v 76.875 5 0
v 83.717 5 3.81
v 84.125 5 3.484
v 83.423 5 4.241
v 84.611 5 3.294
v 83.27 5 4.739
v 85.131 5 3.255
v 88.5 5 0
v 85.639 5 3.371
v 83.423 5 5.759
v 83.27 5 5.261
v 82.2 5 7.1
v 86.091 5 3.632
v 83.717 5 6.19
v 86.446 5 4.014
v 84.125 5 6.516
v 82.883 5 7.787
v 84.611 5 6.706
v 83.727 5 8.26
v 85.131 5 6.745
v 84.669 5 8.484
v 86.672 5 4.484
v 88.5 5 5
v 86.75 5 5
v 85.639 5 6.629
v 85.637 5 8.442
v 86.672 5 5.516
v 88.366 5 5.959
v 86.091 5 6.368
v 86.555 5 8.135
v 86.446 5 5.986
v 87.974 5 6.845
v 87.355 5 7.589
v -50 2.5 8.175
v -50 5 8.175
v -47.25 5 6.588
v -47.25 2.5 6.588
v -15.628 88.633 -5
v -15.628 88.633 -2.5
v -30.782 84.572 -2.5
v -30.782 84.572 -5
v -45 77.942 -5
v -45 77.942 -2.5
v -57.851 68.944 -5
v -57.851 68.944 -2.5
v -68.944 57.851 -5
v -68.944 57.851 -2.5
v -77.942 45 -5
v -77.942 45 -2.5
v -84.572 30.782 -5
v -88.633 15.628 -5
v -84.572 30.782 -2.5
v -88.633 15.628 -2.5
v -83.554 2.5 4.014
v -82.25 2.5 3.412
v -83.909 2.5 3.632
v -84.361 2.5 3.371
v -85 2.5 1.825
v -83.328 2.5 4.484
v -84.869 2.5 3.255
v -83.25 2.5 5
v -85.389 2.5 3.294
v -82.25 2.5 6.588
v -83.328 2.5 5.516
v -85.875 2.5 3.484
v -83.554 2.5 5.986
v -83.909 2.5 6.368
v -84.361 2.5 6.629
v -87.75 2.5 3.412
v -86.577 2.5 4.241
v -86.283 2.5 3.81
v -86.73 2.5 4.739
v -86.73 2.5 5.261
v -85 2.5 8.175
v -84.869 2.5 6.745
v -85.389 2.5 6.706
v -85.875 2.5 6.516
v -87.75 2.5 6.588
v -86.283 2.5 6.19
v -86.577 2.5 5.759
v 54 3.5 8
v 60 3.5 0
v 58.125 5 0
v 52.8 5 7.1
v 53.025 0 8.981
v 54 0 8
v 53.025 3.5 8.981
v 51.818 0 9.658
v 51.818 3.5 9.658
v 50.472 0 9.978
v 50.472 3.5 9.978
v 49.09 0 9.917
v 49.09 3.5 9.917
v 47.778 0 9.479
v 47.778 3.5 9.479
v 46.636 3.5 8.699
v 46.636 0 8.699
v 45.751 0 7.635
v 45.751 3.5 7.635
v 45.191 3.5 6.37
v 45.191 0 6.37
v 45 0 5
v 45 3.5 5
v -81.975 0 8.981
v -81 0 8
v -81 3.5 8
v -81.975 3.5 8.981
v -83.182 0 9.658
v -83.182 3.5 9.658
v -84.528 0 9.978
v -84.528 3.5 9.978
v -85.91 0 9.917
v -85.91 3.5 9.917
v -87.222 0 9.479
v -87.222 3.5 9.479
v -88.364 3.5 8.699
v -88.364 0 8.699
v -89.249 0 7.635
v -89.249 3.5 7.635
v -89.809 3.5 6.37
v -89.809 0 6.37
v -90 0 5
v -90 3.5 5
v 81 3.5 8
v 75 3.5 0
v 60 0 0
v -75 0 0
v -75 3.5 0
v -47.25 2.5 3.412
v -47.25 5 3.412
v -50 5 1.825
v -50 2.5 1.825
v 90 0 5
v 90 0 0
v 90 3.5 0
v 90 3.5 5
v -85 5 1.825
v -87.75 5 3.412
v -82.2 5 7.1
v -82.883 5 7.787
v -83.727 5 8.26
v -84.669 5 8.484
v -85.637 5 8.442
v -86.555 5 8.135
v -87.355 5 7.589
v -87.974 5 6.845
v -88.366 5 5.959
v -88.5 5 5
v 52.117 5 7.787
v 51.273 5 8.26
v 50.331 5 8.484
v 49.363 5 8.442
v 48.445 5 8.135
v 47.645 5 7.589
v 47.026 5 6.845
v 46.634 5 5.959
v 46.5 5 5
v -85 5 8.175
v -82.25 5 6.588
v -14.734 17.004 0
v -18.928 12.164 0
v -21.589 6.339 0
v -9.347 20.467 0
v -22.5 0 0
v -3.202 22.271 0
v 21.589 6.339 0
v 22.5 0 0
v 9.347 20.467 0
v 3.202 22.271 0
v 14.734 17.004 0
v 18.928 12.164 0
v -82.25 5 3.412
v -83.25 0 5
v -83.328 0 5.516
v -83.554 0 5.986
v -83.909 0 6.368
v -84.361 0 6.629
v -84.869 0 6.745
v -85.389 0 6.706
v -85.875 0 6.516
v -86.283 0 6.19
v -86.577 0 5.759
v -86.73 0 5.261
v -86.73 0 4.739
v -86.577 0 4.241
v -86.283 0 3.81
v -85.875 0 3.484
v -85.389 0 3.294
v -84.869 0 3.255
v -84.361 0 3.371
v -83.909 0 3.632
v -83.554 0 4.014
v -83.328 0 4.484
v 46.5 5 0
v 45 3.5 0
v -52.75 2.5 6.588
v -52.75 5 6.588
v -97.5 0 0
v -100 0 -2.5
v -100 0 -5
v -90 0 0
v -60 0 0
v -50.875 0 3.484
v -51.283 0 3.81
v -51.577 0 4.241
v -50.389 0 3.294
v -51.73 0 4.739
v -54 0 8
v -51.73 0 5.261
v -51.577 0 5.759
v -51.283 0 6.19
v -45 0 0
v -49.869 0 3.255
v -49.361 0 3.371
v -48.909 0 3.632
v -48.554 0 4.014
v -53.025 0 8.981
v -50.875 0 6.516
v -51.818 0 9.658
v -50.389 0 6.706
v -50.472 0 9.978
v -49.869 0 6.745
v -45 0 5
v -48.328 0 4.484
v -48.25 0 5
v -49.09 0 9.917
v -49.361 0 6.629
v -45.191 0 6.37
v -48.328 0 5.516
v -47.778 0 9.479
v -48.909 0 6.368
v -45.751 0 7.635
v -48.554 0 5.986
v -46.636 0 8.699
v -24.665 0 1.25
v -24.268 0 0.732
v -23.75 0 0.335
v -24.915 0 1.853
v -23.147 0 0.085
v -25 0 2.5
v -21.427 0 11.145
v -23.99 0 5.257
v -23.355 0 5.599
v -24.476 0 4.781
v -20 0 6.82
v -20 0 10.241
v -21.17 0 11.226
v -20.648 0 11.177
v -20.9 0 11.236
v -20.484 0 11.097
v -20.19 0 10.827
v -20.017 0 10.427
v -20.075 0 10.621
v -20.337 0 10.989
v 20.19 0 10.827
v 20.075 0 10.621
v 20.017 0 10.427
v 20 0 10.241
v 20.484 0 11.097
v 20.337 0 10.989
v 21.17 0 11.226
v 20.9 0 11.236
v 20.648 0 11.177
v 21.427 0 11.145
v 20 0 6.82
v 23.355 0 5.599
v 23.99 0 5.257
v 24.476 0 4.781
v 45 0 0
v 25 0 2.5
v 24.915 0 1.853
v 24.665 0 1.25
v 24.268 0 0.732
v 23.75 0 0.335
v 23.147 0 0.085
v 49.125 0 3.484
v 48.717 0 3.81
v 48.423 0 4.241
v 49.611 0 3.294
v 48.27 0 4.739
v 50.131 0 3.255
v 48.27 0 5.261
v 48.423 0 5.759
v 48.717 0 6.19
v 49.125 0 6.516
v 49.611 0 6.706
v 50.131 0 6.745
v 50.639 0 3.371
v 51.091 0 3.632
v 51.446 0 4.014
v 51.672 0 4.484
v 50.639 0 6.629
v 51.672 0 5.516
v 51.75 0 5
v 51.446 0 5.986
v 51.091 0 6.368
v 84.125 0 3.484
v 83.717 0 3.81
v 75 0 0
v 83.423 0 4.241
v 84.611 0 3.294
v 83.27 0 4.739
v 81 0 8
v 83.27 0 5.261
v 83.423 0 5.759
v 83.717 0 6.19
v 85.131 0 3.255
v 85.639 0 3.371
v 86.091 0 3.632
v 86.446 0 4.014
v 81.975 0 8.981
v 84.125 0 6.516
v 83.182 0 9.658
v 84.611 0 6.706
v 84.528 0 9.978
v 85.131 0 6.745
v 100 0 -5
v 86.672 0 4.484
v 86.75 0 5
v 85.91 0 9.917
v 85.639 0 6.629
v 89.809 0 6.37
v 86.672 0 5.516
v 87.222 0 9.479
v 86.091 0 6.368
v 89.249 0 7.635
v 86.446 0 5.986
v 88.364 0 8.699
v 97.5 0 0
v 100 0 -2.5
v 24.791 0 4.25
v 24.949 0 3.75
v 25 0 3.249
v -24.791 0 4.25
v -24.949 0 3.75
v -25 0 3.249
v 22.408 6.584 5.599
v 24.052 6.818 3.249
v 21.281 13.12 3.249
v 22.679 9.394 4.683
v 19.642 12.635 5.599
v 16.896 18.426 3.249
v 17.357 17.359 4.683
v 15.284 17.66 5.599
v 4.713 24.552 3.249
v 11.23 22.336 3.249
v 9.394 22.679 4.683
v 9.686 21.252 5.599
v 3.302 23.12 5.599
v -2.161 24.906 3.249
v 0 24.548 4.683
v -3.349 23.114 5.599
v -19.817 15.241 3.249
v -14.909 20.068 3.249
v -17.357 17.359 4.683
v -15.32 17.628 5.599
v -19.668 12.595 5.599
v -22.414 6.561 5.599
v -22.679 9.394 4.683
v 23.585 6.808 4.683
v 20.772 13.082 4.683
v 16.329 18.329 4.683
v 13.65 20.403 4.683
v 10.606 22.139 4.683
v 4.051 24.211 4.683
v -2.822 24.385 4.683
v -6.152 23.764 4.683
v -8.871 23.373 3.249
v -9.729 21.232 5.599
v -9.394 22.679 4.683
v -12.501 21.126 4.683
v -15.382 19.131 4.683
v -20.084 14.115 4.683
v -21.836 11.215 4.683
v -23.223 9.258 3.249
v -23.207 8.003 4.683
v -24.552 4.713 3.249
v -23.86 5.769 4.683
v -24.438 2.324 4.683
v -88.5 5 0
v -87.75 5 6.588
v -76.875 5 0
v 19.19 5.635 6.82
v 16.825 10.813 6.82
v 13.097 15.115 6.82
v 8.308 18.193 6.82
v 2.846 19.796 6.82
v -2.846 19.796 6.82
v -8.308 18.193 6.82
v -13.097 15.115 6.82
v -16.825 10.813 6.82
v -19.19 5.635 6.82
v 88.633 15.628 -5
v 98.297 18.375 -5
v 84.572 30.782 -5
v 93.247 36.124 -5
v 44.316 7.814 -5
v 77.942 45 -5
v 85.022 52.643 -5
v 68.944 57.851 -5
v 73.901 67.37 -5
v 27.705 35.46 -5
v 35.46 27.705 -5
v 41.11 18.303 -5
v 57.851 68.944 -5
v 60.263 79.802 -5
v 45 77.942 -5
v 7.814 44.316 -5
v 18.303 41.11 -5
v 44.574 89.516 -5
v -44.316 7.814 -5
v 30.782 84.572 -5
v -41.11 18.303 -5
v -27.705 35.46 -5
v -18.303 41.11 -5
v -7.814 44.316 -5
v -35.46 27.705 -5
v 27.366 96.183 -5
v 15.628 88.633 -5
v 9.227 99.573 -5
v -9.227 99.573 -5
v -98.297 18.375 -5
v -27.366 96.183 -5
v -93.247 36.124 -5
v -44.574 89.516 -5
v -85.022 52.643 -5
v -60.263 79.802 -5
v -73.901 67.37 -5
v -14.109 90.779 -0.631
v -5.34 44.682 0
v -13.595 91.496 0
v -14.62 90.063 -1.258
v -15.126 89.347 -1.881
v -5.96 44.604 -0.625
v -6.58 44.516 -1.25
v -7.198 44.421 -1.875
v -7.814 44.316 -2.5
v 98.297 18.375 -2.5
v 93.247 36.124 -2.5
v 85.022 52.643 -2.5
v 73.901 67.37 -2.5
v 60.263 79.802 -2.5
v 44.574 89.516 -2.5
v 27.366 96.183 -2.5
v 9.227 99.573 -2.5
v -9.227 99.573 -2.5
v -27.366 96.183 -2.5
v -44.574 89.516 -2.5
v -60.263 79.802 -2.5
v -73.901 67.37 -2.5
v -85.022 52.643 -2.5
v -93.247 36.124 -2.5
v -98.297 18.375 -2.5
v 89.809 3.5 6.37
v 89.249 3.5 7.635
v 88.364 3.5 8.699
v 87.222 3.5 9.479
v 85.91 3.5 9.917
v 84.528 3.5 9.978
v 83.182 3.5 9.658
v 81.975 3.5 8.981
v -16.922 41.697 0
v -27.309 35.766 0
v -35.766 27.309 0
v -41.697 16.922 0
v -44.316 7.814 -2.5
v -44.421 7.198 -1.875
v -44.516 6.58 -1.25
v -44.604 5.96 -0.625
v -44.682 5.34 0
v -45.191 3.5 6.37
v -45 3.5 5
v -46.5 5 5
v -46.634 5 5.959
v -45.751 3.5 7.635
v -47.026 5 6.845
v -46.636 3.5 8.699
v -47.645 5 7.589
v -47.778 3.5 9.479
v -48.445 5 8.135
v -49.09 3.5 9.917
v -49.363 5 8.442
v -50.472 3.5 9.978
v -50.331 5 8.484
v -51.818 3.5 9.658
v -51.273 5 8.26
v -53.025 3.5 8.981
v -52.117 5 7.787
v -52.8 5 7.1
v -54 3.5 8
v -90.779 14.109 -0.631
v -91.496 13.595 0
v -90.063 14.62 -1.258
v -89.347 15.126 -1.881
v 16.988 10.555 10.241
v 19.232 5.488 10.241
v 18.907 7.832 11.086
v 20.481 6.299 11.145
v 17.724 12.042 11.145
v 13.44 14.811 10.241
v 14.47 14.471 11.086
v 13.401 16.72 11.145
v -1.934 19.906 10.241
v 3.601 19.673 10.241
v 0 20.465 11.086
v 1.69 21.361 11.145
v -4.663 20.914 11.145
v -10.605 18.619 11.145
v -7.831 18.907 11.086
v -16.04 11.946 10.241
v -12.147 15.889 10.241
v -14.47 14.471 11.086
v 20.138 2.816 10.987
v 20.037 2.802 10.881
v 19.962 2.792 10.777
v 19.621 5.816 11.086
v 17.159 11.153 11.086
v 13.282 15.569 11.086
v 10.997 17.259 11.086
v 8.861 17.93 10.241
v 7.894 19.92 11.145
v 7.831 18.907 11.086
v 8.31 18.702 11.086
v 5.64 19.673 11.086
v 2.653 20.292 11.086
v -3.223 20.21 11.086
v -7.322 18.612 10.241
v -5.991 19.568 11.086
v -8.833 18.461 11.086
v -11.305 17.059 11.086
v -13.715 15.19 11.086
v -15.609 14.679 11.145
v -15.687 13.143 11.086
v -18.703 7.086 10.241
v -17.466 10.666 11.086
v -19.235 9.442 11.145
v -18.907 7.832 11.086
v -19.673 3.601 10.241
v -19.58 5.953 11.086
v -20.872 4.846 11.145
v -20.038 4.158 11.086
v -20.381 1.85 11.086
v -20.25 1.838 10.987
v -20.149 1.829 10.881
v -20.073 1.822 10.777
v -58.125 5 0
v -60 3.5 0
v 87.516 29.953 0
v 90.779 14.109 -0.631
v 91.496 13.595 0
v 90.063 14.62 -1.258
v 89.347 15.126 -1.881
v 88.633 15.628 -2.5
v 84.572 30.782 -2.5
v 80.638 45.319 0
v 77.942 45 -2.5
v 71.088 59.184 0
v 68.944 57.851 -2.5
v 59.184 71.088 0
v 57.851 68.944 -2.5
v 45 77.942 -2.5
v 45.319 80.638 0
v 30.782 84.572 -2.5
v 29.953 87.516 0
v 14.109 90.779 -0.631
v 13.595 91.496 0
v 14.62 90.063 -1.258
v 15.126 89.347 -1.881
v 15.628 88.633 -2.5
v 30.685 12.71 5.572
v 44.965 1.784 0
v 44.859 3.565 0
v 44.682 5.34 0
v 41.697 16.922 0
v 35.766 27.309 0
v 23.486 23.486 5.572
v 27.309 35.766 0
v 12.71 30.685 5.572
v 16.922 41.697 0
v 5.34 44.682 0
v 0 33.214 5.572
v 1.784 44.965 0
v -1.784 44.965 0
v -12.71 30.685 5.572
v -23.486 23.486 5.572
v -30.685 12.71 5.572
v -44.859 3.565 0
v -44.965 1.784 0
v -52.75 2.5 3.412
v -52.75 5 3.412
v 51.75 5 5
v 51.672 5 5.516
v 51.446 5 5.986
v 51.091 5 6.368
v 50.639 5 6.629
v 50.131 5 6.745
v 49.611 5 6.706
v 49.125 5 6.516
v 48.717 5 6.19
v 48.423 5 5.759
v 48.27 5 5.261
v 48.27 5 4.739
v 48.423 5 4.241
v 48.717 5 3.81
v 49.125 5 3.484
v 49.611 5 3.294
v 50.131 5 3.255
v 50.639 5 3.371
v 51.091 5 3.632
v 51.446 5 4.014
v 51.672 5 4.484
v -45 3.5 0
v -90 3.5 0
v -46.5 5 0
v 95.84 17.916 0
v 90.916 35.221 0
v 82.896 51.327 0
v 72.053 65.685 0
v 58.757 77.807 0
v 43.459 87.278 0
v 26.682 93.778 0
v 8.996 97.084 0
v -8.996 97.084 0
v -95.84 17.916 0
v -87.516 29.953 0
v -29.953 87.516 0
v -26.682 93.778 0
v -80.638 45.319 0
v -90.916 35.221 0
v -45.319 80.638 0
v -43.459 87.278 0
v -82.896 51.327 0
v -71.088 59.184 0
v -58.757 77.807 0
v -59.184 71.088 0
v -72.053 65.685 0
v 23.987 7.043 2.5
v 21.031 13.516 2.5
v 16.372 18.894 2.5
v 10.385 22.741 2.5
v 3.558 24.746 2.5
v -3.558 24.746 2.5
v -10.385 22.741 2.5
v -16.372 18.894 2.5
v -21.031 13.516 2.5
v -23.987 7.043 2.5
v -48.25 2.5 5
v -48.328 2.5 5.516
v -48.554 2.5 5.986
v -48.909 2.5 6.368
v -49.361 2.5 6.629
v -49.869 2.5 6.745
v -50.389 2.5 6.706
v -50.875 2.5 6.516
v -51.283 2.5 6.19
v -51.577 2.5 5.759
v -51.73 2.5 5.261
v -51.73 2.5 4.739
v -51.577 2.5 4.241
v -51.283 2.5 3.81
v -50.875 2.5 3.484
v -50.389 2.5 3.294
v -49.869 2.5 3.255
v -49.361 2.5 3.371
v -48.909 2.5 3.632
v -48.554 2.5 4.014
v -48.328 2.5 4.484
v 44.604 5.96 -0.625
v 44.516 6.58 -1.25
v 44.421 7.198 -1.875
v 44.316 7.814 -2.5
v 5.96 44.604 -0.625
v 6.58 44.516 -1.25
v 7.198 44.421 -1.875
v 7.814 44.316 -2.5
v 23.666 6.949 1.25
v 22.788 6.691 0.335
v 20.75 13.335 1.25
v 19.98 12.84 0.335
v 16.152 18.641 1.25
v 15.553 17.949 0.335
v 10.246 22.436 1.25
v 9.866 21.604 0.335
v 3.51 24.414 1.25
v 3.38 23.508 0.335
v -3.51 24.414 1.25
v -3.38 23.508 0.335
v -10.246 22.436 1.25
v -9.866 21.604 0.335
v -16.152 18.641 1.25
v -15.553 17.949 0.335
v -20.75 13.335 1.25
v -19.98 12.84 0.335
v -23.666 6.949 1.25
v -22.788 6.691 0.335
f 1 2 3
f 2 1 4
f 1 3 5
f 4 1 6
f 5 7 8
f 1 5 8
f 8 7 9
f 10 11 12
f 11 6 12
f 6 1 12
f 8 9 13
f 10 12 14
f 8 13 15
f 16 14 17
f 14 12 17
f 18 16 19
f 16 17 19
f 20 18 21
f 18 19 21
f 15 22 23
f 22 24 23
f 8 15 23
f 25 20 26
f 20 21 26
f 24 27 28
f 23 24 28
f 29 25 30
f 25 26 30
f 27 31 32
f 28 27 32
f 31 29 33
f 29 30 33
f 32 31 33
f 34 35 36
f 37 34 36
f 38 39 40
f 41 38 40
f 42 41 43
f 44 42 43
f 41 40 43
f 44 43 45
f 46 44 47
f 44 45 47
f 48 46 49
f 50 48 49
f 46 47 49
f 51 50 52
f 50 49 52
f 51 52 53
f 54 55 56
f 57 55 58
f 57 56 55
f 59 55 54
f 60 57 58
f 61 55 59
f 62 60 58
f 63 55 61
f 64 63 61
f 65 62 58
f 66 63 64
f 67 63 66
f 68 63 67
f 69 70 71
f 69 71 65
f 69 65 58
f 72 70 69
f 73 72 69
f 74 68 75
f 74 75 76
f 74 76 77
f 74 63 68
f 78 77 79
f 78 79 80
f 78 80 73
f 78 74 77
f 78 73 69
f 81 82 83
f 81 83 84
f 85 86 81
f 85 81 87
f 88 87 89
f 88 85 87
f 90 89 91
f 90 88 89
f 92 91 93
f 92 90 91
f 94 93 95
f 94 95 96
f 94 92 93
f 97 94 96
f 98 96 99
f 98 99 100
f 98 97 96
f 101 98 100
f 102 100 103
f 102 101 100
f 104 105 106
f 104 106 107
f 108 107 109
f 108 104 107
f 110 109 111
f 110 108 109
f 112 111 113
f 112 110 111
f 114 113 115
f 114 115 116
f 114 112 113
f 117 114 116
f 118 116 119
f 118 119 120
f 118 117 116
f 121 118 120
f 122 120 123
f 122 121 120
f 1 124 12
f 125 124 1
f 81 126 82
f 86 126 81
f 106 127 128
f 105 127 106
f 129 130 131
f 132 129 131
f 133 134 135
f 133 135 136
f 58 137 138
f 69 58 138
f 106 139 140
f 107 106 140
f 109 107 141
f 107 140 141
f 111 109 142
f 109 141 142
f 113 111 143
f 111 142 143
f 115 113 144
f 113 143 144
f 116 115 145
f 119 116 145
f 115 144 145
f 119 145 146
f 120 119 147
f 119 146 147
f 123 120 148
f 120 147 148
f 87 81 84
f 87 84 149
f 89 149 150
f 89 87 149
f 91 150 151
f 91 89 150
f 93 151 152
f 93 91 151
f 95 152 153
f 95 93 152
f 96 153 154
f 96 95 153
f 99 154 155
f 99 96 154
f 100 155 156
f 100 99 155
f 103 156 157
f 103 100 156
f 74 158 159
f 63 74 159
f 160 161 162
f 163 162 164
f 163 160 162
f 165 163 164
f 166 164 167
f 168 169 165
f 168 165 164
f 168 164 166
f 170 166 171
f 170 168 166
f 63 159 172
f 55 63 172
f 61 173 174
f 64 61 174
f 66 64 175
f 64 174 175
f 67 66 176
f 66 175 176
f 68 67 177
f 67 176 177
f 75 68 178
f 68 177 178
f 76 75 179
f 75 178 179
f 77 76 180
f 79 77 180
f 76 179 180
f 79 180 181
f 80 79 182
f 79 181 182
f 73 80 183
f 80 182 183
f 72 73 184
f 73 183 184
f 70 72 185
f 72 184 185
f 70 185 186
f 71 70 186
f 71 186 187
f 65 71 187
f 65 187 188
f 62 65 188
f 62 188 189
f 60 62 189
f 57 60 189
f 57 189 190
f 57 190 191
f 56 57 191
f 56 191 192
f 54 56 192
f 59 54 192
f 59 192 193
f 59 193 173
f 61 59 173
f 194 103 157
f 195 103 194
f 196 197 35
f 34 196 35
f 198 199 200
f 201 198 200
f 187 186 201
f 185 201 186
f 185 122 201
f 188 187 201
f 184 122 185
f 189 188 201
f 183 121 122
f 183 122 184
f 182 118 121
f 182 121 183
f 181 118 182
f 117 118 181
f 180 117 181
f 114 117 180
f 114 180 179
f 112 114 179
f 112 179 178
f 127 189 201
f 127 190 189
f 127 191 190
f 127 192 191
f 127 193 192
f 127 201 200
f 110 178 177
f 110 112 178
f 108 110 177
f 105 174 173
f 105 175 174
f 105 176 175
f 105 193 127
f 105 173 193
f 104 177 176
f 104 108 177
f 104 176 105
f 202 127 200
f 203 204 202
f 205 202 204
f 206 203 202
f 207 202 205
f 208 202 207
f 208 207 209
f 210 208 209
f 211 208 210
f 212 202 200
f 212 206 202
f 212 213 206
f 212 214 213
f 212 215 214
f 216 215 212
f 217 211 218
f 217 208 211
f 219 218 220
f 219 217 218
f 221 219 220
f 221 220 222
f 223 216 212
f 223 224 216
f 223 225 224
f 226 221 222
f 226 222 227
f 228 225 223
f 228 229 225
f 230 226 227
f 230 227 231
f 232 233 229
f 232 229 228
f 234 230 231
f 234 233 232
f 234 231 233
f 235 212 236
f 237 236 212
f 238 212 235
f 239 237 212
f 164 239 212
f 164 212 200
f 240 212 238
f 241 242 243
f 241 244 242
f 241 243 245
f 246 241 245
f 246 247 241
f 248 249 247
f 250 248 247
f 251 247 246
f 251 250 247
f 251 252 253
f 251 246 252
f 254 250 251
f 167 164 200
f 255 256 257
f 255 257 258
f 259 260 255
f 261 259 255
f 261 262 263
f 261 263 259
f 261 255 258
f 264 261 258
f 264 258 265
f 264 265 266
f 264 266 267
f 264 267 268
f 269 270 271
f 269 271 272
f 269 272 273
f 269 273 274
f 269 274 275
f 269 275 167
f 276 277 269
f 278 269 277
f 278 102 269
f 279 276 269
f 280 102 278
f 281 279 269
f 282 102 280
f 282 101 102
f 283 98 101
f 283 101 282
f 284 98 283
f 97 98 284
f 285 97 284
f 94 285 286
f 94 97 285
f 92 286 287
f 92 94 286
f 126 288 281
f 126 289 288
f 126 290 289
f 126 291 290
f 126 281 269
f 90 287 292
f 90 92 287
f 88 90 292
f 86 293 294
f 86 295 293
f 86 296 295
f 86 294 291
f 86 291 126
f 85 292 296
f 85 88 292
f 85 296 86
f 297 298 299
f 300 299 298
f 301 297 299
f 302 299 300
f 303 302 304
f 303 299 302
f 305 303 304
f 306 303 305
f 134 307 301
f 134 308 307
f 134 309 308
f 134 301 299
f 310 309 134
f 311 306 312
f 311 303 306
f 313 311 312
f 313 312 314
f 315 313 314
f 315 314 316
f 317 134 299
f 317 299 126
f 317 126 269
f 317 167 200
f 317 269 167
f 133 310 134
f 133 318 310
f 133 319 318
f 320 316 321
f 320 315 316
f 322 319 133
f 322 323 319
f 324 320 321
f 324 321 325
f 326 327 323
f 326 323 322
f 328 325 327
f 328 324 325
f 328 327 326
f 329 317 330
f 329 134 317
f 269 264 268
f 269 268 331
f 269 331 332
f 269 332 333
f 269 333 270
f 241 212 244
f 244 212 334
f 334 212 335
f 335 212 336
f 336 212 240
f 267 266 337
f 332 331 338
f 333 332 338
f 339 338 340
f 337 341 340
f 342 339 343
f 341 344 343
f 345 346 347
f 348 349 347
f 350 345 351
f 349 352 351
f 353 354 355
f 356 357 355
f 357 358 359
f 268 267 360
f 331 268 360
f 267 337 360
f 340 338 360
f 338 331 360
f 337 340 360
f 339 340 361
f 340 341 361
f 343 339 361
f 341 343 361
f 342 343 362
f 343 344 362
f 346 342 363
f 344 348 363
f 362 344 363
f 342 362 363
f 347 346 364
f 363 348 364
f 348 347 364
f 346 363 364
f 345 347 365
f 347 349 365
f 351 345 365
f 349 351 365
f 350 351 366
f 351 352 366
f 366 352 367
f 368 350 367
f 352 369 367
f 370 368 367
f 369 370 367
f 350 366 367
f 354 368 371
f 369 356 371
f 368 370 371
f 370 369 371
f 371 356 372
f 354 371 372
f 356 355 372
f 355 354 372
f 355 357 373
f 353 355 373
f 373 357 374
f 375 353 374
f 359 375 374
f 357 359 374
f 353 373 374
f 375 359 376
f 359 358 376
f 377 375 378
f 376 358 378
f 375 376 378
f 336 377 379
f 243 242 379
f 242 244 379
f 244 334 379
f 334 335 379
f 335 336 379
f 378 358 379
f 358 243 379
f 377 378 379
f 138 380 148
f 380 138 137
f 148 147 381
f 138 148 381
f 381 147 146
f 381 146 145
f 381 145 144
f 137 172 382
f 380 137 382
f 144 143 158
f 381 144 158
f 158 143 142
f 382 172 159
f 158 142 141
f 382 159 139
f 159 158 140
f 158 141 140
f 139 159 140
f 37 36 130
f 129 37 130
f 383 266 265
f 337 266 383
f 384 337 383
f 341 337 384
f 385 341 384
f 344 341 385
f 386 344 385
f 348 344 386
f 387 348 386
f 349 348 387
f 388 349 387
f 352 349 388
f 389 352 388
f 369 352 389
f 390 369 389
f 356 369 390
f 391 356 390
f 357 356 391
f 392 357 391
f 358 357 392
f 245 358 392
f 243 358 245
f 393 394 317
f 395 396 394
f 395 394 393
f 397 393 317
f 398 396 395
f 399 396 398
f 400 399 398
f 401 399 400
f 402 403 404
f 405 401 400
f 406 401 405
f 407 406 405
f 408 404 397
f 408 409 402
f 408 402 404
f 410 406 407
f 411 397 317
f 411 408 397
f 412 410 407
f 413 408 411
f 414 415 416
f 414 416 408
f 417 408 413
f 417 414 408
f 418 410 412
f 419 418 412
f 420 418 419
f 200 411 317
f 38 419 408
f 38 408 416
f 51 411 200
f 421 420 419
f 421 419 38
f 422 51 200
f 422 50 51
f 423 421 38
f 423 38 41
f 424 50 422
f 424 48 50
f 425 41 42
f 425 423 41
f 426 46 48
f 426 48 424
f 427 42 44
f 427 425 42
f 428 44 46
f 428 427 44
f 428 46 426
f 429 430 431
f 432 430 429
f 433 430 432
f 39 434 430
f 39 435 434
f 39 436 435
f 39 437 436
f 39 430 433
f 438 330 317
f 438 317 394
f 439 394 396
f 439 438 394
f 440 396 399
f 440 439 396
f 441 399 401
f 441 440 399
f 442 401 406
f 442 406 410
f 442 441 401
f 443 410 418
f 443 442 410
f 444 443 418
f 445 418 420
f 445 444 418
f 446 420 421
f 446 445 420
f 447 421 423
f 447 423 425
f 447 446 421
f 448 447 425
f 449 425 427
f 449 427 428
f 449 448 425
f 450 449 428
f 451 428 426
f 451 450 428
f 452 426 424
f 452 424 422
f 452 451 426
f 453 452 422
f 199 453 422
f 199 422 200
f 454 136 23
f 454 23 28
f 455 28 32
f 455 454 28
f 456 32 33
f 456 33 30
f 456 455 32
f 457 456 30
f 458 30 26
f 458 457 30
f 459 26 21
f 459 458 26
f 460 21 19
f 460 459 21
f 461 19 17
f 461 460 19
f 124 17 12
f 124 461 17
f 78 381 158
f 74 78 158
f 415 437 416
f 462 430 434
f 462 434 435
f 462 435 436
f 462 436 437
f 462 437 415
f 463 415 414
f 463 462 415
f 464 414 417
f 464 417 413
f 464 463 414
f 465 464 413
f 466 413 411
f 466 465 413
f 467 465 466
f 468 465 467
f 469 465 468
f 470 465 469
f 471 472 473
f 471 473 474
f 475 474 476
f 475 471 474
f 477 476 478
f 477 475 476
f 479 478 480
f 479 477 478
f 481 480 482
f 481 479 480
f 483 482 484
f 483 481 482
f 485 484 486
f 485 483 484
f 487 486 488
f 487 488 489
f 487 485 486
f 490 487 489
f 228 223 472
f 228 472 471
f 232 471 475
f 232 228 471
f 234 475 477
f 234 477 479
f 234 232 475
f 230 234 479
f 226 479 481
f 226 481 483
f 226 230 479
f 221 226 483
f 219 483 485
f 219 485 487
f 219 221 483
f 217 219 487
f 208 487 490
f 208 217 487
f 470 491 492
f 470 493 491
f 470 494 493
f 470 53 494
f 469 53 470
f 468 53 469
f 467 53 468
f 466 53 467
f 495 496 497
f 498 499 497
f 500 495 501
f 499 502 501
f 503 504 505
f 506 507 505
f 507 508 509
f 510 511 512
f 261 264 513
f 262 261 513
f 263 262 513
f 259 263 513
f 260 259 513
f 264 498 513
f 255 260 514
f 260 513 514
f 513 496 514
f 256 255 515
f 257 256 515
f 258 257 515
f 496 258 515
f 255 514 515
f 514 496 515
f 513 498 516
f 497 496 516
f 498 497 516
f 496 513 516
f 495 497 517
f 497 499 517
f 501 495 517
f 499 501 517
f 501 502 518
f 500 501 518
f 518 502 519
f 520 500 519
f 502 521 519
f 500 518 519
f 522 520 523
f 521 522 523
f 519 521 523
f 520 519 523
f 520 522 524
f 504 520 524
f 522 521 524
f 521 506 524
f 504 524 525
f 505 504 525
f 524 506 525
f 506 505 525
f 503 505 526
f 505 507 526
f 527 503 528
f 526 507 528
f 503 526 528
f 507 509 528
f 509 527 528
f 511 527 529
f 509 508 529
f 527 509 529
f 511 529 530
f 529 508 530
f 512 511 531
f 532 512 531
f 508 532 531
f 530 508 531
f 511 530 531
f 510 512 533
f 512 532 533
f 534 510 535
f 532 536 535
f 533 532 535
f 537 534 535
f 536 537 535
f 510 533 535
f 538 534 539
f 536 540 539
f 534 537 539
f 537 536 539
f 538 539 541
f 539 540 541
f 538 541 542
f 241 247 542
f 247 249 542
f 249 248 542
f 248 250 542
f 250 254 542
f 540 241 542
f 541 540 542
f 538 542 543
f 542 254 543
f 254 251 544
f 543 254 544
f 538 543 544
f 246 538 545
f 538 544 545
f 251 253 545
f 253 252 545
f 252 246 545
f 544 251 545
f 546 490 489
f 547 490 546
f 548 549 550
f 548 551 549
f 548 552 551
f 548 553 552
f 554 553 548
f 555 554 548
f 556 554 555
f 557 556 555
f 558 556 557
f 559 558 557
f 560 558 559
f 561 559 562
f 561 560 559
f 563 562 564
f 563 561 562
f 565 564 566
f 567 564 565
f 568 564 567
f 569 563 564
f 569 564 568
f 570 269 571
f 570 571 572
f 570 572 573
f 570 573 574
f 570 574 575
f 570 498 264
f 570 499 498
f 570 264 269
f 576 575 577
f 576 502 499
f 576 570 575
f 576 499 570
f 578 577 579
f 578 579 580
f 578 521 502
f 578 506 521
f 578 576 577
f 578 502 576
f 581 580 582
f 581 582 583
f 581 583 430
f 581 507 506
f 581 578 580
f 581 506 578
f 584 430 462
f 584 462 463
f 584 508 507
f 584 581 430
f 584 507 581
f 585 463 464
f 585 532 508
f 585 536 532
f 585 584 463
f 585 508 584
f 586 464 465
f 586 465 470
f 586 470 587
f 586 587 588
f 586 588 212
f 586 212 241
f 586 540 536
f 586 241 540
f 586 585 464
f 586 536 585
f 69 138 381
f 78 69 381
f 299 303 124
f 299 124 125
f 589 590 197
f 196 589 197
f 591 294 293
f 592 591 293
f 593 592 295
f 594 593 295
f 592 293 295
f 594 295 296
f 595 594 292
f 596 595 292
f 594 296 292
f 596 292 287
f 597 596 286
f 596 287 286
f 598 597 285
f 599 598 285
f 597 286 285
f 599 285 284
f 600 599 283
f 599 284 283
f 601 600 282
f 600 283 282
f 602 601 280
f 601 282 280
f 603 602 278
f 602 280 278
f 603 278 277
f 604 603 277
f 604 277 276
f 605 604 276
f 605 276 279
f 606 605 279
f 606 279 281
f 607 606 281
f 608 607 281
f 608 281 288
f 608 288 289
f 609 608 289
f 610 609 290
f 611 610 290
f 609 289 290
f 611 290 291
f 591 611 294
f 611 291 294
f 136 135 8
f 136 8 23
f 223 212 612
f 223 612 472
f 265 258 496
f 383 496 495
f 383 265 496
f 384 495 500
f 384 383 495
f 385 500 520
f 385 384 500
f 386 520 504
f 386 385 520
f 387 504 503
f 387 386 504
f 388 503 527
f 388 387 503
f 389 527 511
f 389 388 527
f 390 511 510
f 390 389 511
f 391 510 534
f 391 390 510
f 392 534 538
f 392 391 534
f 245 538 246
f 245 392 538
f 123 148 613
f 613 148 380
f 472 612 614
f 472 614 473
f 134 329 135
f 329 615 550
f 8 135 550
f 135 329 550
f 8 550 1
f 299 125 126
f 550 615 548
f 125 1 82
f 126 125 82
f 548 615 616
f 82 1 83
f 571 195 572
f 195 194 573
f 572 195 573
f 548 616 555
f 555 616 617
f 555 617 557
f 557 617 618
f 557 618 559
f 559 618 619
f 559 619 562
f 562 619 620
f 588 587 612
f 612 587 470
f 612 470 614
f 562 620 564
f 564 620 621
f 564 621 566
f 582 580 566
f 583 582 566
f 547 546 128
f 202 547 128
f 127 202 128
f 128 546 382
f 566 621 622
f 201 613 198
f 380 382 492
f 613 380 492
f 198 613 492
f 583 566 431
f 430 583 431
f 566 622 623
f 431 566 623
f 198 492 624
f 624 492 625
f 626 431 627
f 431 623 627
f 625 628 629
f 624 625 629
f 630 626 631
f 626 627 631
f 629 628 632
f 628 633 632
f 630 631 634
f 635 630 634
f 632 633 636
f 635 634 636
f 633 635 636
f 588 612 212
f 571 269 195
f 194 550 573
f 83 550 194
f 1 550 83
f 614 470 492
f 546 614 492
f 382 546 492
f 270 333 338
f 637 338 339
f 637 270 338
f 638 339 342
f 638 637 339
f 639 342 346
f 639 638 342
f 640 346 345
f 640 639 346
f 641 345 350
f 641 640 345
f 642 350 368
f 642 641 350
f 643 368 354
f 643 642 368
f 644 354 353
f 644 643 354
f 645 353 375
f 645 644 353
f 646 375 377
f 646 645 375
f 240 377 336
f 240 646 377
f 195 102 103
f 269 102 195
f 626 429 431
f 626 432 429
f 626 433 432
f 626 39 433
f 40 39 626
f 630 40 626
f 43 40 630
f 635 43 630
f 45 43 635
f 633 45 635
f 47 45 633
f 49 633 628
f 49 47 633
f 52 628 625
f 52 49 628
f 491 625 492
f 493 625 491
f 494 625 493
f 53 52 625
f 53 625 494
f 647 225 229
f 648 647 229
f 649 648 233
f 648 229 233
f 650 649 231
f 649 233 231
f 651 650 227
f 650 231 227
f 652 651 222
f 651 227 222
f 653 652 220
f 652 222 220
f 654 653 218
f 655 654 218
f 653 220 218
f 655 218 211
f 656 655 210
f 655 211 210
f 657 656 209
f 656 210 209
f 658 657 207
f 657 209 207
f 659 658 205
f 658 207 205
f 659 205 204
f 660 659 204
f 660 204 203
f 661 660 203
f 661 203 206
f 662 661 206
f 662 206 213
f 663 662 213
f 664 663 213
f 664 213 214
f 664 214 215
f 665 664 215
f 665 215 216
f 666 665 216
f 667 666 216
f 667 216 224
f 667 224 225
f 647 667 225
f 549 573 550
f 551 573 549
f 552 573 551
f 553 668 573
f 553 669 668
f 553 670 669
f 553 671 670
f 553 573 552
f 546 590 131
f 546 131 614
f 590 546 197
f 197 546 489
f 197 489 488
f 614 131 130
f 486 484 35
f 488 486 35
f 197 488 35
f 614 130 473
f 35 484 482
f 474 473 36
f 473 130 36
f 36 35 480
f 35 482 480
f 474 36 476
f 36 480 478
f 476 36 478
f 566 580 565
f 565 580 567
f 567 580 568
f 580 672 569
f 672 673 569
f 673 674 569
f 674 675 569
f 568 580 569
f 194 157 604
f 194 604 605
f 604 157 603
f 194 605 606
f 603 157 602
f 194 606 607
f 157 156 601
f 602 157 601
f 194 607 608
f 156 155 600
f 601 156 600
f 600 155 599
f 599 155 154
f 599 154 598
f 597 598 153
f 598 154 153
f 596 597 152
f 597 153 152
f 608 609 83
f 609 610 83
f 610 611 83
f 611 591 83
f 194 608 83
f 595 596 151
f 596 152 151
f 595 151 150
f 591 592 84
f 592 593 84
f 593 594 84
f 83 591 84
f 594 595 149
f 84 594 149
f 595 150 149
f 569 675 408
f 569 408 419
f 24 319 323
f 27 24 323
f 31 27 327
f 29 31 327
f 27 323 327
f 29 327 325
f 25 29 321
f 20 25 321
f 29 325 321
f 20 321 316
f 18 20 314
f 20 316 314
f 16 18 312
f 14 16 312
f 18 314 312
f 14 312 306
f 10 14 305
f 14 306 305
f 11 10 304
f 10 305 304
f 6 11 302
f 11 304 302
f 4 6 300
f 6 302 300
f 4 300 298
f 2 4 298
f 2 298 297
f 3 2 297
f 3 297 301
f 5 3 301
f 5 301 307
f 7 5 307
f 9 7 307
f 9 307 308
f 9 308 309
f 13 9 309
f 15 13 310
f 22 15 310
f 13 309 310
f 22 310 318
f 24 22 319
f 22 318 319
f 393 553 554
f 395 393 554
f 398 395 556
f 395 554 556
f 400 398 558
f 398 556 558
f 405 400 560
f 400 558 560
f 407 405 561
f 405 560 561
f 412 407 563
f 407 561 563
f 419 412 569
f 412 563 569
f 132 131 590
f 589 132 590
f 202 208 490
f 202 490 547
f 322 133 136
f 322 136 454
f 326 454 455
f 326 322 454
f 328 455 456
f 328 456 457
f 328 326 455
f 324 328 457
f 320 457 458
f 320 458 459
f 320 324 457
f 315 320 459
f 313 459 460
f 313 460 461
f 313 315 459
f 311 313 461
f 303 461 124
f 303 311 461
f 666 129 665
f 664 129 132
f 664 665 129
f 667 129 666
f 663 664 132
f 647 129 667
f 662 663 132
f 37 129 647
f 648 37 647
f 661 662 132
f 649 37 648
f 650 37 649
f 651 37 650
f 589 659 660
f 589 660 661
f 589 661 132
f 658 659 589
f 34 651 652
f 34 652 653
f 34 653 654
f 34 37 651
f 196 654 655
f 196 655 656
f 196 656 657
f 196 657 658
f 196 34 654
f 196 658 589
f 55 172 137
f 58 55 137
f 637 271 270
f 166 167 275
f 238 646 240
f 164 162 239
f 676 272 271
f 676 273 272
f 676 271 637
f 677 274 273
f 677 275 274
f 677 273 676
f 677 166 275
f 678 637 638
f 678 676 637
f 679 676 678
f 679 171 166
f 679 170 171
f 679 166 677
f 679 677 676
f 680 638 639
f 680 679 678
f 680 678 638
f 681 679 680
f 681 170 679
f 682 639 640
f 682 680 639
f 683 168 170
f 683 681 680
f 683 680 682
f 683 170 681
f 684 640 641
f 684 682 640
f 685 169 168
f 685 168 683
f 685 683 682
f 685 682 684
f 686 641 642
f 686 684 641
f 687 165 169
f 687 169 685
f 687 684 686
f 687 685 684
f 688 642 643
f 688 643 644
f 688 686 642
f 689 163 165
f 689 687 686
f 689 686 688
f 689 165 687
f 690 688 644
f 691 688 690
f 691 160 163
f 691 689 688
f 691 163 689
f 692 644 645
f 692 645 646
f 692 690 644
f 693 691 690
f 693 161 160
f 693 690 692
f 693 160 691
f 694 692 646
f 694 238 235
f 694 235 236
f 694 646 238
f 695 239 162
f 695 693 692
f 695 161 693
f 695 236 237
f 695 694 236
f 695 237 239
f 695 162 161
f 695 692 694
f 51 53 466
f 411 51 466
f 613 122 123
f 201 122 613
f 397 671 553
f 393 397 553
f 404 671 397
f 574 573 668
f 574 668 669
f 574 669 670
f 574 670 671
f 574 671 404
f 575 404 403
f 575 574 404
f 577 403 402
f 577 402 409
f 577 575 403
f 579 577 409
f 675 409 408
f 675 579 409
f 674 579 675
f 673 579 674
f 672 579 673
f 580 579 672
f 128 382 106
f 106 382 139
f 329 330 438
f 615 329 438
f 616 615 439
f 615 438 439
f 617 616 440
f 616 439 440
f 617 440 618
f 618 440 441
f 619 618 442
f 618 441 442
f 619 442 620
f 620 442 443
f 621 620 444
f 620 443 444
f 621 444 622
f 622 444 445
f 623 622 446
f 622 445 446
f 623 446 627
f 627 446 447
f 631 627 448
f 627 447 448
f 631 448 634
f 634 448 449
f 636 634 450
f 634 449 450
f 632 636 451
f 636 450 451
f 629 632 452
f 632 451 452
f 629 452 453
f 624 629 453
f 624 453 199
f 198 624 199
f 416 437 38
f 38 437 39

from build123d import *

# Parameters (mm, degrees)
F1_ANGLE      = 180
F0_W          = 10
F0_H          = 5
F2_R          = 1
F3_R          = 2.5
F4_W          = 45
F4_H          = 5
F5_ANGLE      = 10
F6_W          = 45
F6_H          = 5
F7_ANGLE      = 10
F8_W          = 45
F8_H          = 5
F9_ANGLE_BACK = 10
F9_ANGLE      = 20
F10_R         = 1.75
F11_DEPTH     = 5
F13_DEPTH     = 2.5
F14_SIZE      = 2.5
F16_DEPTH     = 5
F17_SIZE      = 1.5


with BuildPart() as f1:
    # F0 (on Front) → F1 (revolve)
    with BuildSketch(Plane.XZ):
        Polygon((25, 0), (0, 0), (0, -5), (45, -5), (45, 0), (20, 11.8198511713), (20, 6.8198511713), (25, 5), align=None)
    revolve(axis=Axis((0, 0, -2.5), (0, 0, 1)), revolution_arc=F1_ANGLE)

    # F2
    f2_edges = [f1.edges().sort_by_distance(p)[0] for p in [
        (0, 20, 11.819851),
    ]]
    fillet(f2_edges, radius=F2_R)

    # F3
    f3_edges = [f1.edges().sort_by_distance(p)[0] for p in [
        (0, 25, 5),
        (0, 25, 0),
    ]]
    fillet(f3_edges, radius=F3_R)



with BuildPart() as f1b:
    # F0 (on Front) → F1, piece 2 (revolve)
    with BuildSketch(Plane.XZ):
        with Locations((95, -2.5)):
            Rectangle(F0_W, F0_H)
    revolve(axis=Axis((0, 0, -2.5), (0, 0, 1)), revolution_arc=F1_ANGLE)


with BuildPart() as f1_1:
    add(f1.part)

    add(f1b.part)  # F5 merges F1b
    # F4 (on face) → F5 (revolve)
    with BuildSketch(Plane.XZ):
        with Locations((67.5, -2.5)):
            Rectangle(F4_W, F4_H)
    revolve(axis=Axis((0, 0, 10), (0, 0, 1)), revolution_arc=F5_ANGLE)

    # F6 (on face) → F7 (revolve)
    with BuildSketch(Plane.XZ):
        with Locations((-67.5, -2.5)):
            Rectangle(F6_W, F6_H)
    revolve(axis=Axis((0, 0, 10), (0, 0, -1)), revolution_arc=F7_ANGLE)

    # F8 (on Right) → F9 (revolve)
    with BuildSketch(Plane.YZ, mode=Mode.PRIVATE) as f9_sk:
        with Locations((67.5, -2.5)):
            Rectangle(F8_W, F8_H)
    revolve(f9_sk.sketch.rotate(Axis((0, 0, 10), (0, 0, 1)), -F9_ANGLE_BACK), axis=Axis((0, 0, 10), (0, 0, 1)), revolution_arc=F9_ANGLE)

    # F10 (on face) → F11 (join)
    with BuildSketch(Plane.XZ):
        with BuildLine():
            Line((-90, 5), (-90, 0))
            Line((-90, 0), (-80, 0))
            Line((-80, 0), (-80, 5))
            ThreePointArc((-80, 5), (-85, 10), (-90, 5))
        make_face()
        with Locations((-85, 5)):
            Circle(F10_R, mode=Mode.SUBTRACT)
        with BuildLine():
            Line((-55, 0), (-45, 0))
            Line((-45, 0), (-45, 5))
            ThreePointArc((-45, 5), (-50, 10), (-55, 5))
            Line((-55, 5), (-55, 0))
        make_face()
        with Locations((-50, 5)):
            Circle(F10_R, mode=Mode.SUBTRACT)
        with BuildLine():
            Line((80, 5), (80, 0))
            Line((80, 0), (90, 0))
            Line((90, 0), (90, 5))
            ThreePointArc((90, 5), (85, 10), (80, 5))
        make_face()
        with Locations((85, 5)):
            Circle(F10_R, mode=Mode.SUBTRACT)
        with BuildLine():
            Line((45, 0), (55, 0))
            Line((55, 0), (55, 5))
            ThreePointArc((55, 5), (50, 10), (45, 5))
            Line((45, 5), (45, 0))
        make_face()
        with Locations((50, 5)):
            Circle(F10_R, mode=Mode.SUBTRACT)
    extrude(amount=-F11_DEPTH)

    # F12 (on face) → F13 (cut)
    with BuildSketch(Plane(origin=(0, 5, 0), x_dir=(-1, 0, 0), z_dir=(0, 1, 0))):
        Polygon((52.75, 3.4122867597), (52.75, 6.5877132403), (50, 8.1754264805), (47.25, 6.5877132403), (47.25, 3.4122867597), (50, 1.8245735195), align=None)
        Polygon((82.25, 6.5877132403), (82.25, 3.4122867597), (85, 1.8245735195), (87.75, 3.4122867597), (87.75, 6.5877132403), (85, 8.1754264805), align=None)
    extrude(amount=-F13_DEPTH, mode=Mode.SUBTRACT)

    # F14
    f14_edges = [f1_1.edges().sort_by_distance(p)[0] for p in [
        (-11.721252, 66.474523, 0),
        (11.721252, 66.474523, 0),
        (-63.63961, 63.63961, 0),
        (-66.474523, 11.721252, 0),
        (66.474523, 11.721252, 0),
        (63.63961, 63.63961, 0),
        (0, 100, 0),
    ]]
    chamfer(f14_edges, length=F14_SIZE)

    # F15 (on face) → F16 (join, through all)
    with BuildSketch(Plane.XZ):
        with BuildLine():
            Line((-80, 0), (-75, 0))
            Line((-75, 0), (-81, 8))
            ThreePointArc((-81, 8), (-80.2565835097, 6.5811388301), (-80, 5))
            Line((-80, 5), (-80, 0))
        make_face()
        with BuildLine():
            Line((-60, 0), (-55, 0))
            Line((-55, 0), (-55, 5))
            ThreePointArc((-55, 5), (-54.7434164903, 6.5811388301), (-54, 8))
            Line((-54, 8), (-60, 0))
        make_face()
        with BuildLine():
            ThreePointArc((54, 8), (54.7434164903, 6.5811388301), (55, 5))
            Line((55, 5), (55, 0))
            Line((55, 0), (60, 0))
            Line((60, 0), (54, 8))
        make_face()
        with BuildLine():
            Line((80, 0), (80, 5))
            ThreePointArc((80, 5), (80.2565835097, 6.5811388301), (81, 8))
            Line((81, 8), (75, 0))
            Line((75, 0), (80, 0))
        make_face()
    extrude(amount=-F16_DEPTH)

    # F17
    f17_edges = [f1_1.edges().sort_by_distance(p)[0] for p in [
        (-57, 5, 4),
        (-78, 5, 4),
        (78, 5, 4),
        (57, 5, 4),
        (90, 5, 2.5),
        (86.581139, 5, 9.743416),
        (48.418861, 5, 9.743416),
        (45, 5, 2.5),
        (-45, 5, 2.5),
        (-48.418861, 5, 9.743416),
        (-86.581139, 5, 9.743416),
        (-90, 5, 2.5),
    ]]
    chamfer(f17_edges, length=F17_SIZE)


solid = f1_1.part
